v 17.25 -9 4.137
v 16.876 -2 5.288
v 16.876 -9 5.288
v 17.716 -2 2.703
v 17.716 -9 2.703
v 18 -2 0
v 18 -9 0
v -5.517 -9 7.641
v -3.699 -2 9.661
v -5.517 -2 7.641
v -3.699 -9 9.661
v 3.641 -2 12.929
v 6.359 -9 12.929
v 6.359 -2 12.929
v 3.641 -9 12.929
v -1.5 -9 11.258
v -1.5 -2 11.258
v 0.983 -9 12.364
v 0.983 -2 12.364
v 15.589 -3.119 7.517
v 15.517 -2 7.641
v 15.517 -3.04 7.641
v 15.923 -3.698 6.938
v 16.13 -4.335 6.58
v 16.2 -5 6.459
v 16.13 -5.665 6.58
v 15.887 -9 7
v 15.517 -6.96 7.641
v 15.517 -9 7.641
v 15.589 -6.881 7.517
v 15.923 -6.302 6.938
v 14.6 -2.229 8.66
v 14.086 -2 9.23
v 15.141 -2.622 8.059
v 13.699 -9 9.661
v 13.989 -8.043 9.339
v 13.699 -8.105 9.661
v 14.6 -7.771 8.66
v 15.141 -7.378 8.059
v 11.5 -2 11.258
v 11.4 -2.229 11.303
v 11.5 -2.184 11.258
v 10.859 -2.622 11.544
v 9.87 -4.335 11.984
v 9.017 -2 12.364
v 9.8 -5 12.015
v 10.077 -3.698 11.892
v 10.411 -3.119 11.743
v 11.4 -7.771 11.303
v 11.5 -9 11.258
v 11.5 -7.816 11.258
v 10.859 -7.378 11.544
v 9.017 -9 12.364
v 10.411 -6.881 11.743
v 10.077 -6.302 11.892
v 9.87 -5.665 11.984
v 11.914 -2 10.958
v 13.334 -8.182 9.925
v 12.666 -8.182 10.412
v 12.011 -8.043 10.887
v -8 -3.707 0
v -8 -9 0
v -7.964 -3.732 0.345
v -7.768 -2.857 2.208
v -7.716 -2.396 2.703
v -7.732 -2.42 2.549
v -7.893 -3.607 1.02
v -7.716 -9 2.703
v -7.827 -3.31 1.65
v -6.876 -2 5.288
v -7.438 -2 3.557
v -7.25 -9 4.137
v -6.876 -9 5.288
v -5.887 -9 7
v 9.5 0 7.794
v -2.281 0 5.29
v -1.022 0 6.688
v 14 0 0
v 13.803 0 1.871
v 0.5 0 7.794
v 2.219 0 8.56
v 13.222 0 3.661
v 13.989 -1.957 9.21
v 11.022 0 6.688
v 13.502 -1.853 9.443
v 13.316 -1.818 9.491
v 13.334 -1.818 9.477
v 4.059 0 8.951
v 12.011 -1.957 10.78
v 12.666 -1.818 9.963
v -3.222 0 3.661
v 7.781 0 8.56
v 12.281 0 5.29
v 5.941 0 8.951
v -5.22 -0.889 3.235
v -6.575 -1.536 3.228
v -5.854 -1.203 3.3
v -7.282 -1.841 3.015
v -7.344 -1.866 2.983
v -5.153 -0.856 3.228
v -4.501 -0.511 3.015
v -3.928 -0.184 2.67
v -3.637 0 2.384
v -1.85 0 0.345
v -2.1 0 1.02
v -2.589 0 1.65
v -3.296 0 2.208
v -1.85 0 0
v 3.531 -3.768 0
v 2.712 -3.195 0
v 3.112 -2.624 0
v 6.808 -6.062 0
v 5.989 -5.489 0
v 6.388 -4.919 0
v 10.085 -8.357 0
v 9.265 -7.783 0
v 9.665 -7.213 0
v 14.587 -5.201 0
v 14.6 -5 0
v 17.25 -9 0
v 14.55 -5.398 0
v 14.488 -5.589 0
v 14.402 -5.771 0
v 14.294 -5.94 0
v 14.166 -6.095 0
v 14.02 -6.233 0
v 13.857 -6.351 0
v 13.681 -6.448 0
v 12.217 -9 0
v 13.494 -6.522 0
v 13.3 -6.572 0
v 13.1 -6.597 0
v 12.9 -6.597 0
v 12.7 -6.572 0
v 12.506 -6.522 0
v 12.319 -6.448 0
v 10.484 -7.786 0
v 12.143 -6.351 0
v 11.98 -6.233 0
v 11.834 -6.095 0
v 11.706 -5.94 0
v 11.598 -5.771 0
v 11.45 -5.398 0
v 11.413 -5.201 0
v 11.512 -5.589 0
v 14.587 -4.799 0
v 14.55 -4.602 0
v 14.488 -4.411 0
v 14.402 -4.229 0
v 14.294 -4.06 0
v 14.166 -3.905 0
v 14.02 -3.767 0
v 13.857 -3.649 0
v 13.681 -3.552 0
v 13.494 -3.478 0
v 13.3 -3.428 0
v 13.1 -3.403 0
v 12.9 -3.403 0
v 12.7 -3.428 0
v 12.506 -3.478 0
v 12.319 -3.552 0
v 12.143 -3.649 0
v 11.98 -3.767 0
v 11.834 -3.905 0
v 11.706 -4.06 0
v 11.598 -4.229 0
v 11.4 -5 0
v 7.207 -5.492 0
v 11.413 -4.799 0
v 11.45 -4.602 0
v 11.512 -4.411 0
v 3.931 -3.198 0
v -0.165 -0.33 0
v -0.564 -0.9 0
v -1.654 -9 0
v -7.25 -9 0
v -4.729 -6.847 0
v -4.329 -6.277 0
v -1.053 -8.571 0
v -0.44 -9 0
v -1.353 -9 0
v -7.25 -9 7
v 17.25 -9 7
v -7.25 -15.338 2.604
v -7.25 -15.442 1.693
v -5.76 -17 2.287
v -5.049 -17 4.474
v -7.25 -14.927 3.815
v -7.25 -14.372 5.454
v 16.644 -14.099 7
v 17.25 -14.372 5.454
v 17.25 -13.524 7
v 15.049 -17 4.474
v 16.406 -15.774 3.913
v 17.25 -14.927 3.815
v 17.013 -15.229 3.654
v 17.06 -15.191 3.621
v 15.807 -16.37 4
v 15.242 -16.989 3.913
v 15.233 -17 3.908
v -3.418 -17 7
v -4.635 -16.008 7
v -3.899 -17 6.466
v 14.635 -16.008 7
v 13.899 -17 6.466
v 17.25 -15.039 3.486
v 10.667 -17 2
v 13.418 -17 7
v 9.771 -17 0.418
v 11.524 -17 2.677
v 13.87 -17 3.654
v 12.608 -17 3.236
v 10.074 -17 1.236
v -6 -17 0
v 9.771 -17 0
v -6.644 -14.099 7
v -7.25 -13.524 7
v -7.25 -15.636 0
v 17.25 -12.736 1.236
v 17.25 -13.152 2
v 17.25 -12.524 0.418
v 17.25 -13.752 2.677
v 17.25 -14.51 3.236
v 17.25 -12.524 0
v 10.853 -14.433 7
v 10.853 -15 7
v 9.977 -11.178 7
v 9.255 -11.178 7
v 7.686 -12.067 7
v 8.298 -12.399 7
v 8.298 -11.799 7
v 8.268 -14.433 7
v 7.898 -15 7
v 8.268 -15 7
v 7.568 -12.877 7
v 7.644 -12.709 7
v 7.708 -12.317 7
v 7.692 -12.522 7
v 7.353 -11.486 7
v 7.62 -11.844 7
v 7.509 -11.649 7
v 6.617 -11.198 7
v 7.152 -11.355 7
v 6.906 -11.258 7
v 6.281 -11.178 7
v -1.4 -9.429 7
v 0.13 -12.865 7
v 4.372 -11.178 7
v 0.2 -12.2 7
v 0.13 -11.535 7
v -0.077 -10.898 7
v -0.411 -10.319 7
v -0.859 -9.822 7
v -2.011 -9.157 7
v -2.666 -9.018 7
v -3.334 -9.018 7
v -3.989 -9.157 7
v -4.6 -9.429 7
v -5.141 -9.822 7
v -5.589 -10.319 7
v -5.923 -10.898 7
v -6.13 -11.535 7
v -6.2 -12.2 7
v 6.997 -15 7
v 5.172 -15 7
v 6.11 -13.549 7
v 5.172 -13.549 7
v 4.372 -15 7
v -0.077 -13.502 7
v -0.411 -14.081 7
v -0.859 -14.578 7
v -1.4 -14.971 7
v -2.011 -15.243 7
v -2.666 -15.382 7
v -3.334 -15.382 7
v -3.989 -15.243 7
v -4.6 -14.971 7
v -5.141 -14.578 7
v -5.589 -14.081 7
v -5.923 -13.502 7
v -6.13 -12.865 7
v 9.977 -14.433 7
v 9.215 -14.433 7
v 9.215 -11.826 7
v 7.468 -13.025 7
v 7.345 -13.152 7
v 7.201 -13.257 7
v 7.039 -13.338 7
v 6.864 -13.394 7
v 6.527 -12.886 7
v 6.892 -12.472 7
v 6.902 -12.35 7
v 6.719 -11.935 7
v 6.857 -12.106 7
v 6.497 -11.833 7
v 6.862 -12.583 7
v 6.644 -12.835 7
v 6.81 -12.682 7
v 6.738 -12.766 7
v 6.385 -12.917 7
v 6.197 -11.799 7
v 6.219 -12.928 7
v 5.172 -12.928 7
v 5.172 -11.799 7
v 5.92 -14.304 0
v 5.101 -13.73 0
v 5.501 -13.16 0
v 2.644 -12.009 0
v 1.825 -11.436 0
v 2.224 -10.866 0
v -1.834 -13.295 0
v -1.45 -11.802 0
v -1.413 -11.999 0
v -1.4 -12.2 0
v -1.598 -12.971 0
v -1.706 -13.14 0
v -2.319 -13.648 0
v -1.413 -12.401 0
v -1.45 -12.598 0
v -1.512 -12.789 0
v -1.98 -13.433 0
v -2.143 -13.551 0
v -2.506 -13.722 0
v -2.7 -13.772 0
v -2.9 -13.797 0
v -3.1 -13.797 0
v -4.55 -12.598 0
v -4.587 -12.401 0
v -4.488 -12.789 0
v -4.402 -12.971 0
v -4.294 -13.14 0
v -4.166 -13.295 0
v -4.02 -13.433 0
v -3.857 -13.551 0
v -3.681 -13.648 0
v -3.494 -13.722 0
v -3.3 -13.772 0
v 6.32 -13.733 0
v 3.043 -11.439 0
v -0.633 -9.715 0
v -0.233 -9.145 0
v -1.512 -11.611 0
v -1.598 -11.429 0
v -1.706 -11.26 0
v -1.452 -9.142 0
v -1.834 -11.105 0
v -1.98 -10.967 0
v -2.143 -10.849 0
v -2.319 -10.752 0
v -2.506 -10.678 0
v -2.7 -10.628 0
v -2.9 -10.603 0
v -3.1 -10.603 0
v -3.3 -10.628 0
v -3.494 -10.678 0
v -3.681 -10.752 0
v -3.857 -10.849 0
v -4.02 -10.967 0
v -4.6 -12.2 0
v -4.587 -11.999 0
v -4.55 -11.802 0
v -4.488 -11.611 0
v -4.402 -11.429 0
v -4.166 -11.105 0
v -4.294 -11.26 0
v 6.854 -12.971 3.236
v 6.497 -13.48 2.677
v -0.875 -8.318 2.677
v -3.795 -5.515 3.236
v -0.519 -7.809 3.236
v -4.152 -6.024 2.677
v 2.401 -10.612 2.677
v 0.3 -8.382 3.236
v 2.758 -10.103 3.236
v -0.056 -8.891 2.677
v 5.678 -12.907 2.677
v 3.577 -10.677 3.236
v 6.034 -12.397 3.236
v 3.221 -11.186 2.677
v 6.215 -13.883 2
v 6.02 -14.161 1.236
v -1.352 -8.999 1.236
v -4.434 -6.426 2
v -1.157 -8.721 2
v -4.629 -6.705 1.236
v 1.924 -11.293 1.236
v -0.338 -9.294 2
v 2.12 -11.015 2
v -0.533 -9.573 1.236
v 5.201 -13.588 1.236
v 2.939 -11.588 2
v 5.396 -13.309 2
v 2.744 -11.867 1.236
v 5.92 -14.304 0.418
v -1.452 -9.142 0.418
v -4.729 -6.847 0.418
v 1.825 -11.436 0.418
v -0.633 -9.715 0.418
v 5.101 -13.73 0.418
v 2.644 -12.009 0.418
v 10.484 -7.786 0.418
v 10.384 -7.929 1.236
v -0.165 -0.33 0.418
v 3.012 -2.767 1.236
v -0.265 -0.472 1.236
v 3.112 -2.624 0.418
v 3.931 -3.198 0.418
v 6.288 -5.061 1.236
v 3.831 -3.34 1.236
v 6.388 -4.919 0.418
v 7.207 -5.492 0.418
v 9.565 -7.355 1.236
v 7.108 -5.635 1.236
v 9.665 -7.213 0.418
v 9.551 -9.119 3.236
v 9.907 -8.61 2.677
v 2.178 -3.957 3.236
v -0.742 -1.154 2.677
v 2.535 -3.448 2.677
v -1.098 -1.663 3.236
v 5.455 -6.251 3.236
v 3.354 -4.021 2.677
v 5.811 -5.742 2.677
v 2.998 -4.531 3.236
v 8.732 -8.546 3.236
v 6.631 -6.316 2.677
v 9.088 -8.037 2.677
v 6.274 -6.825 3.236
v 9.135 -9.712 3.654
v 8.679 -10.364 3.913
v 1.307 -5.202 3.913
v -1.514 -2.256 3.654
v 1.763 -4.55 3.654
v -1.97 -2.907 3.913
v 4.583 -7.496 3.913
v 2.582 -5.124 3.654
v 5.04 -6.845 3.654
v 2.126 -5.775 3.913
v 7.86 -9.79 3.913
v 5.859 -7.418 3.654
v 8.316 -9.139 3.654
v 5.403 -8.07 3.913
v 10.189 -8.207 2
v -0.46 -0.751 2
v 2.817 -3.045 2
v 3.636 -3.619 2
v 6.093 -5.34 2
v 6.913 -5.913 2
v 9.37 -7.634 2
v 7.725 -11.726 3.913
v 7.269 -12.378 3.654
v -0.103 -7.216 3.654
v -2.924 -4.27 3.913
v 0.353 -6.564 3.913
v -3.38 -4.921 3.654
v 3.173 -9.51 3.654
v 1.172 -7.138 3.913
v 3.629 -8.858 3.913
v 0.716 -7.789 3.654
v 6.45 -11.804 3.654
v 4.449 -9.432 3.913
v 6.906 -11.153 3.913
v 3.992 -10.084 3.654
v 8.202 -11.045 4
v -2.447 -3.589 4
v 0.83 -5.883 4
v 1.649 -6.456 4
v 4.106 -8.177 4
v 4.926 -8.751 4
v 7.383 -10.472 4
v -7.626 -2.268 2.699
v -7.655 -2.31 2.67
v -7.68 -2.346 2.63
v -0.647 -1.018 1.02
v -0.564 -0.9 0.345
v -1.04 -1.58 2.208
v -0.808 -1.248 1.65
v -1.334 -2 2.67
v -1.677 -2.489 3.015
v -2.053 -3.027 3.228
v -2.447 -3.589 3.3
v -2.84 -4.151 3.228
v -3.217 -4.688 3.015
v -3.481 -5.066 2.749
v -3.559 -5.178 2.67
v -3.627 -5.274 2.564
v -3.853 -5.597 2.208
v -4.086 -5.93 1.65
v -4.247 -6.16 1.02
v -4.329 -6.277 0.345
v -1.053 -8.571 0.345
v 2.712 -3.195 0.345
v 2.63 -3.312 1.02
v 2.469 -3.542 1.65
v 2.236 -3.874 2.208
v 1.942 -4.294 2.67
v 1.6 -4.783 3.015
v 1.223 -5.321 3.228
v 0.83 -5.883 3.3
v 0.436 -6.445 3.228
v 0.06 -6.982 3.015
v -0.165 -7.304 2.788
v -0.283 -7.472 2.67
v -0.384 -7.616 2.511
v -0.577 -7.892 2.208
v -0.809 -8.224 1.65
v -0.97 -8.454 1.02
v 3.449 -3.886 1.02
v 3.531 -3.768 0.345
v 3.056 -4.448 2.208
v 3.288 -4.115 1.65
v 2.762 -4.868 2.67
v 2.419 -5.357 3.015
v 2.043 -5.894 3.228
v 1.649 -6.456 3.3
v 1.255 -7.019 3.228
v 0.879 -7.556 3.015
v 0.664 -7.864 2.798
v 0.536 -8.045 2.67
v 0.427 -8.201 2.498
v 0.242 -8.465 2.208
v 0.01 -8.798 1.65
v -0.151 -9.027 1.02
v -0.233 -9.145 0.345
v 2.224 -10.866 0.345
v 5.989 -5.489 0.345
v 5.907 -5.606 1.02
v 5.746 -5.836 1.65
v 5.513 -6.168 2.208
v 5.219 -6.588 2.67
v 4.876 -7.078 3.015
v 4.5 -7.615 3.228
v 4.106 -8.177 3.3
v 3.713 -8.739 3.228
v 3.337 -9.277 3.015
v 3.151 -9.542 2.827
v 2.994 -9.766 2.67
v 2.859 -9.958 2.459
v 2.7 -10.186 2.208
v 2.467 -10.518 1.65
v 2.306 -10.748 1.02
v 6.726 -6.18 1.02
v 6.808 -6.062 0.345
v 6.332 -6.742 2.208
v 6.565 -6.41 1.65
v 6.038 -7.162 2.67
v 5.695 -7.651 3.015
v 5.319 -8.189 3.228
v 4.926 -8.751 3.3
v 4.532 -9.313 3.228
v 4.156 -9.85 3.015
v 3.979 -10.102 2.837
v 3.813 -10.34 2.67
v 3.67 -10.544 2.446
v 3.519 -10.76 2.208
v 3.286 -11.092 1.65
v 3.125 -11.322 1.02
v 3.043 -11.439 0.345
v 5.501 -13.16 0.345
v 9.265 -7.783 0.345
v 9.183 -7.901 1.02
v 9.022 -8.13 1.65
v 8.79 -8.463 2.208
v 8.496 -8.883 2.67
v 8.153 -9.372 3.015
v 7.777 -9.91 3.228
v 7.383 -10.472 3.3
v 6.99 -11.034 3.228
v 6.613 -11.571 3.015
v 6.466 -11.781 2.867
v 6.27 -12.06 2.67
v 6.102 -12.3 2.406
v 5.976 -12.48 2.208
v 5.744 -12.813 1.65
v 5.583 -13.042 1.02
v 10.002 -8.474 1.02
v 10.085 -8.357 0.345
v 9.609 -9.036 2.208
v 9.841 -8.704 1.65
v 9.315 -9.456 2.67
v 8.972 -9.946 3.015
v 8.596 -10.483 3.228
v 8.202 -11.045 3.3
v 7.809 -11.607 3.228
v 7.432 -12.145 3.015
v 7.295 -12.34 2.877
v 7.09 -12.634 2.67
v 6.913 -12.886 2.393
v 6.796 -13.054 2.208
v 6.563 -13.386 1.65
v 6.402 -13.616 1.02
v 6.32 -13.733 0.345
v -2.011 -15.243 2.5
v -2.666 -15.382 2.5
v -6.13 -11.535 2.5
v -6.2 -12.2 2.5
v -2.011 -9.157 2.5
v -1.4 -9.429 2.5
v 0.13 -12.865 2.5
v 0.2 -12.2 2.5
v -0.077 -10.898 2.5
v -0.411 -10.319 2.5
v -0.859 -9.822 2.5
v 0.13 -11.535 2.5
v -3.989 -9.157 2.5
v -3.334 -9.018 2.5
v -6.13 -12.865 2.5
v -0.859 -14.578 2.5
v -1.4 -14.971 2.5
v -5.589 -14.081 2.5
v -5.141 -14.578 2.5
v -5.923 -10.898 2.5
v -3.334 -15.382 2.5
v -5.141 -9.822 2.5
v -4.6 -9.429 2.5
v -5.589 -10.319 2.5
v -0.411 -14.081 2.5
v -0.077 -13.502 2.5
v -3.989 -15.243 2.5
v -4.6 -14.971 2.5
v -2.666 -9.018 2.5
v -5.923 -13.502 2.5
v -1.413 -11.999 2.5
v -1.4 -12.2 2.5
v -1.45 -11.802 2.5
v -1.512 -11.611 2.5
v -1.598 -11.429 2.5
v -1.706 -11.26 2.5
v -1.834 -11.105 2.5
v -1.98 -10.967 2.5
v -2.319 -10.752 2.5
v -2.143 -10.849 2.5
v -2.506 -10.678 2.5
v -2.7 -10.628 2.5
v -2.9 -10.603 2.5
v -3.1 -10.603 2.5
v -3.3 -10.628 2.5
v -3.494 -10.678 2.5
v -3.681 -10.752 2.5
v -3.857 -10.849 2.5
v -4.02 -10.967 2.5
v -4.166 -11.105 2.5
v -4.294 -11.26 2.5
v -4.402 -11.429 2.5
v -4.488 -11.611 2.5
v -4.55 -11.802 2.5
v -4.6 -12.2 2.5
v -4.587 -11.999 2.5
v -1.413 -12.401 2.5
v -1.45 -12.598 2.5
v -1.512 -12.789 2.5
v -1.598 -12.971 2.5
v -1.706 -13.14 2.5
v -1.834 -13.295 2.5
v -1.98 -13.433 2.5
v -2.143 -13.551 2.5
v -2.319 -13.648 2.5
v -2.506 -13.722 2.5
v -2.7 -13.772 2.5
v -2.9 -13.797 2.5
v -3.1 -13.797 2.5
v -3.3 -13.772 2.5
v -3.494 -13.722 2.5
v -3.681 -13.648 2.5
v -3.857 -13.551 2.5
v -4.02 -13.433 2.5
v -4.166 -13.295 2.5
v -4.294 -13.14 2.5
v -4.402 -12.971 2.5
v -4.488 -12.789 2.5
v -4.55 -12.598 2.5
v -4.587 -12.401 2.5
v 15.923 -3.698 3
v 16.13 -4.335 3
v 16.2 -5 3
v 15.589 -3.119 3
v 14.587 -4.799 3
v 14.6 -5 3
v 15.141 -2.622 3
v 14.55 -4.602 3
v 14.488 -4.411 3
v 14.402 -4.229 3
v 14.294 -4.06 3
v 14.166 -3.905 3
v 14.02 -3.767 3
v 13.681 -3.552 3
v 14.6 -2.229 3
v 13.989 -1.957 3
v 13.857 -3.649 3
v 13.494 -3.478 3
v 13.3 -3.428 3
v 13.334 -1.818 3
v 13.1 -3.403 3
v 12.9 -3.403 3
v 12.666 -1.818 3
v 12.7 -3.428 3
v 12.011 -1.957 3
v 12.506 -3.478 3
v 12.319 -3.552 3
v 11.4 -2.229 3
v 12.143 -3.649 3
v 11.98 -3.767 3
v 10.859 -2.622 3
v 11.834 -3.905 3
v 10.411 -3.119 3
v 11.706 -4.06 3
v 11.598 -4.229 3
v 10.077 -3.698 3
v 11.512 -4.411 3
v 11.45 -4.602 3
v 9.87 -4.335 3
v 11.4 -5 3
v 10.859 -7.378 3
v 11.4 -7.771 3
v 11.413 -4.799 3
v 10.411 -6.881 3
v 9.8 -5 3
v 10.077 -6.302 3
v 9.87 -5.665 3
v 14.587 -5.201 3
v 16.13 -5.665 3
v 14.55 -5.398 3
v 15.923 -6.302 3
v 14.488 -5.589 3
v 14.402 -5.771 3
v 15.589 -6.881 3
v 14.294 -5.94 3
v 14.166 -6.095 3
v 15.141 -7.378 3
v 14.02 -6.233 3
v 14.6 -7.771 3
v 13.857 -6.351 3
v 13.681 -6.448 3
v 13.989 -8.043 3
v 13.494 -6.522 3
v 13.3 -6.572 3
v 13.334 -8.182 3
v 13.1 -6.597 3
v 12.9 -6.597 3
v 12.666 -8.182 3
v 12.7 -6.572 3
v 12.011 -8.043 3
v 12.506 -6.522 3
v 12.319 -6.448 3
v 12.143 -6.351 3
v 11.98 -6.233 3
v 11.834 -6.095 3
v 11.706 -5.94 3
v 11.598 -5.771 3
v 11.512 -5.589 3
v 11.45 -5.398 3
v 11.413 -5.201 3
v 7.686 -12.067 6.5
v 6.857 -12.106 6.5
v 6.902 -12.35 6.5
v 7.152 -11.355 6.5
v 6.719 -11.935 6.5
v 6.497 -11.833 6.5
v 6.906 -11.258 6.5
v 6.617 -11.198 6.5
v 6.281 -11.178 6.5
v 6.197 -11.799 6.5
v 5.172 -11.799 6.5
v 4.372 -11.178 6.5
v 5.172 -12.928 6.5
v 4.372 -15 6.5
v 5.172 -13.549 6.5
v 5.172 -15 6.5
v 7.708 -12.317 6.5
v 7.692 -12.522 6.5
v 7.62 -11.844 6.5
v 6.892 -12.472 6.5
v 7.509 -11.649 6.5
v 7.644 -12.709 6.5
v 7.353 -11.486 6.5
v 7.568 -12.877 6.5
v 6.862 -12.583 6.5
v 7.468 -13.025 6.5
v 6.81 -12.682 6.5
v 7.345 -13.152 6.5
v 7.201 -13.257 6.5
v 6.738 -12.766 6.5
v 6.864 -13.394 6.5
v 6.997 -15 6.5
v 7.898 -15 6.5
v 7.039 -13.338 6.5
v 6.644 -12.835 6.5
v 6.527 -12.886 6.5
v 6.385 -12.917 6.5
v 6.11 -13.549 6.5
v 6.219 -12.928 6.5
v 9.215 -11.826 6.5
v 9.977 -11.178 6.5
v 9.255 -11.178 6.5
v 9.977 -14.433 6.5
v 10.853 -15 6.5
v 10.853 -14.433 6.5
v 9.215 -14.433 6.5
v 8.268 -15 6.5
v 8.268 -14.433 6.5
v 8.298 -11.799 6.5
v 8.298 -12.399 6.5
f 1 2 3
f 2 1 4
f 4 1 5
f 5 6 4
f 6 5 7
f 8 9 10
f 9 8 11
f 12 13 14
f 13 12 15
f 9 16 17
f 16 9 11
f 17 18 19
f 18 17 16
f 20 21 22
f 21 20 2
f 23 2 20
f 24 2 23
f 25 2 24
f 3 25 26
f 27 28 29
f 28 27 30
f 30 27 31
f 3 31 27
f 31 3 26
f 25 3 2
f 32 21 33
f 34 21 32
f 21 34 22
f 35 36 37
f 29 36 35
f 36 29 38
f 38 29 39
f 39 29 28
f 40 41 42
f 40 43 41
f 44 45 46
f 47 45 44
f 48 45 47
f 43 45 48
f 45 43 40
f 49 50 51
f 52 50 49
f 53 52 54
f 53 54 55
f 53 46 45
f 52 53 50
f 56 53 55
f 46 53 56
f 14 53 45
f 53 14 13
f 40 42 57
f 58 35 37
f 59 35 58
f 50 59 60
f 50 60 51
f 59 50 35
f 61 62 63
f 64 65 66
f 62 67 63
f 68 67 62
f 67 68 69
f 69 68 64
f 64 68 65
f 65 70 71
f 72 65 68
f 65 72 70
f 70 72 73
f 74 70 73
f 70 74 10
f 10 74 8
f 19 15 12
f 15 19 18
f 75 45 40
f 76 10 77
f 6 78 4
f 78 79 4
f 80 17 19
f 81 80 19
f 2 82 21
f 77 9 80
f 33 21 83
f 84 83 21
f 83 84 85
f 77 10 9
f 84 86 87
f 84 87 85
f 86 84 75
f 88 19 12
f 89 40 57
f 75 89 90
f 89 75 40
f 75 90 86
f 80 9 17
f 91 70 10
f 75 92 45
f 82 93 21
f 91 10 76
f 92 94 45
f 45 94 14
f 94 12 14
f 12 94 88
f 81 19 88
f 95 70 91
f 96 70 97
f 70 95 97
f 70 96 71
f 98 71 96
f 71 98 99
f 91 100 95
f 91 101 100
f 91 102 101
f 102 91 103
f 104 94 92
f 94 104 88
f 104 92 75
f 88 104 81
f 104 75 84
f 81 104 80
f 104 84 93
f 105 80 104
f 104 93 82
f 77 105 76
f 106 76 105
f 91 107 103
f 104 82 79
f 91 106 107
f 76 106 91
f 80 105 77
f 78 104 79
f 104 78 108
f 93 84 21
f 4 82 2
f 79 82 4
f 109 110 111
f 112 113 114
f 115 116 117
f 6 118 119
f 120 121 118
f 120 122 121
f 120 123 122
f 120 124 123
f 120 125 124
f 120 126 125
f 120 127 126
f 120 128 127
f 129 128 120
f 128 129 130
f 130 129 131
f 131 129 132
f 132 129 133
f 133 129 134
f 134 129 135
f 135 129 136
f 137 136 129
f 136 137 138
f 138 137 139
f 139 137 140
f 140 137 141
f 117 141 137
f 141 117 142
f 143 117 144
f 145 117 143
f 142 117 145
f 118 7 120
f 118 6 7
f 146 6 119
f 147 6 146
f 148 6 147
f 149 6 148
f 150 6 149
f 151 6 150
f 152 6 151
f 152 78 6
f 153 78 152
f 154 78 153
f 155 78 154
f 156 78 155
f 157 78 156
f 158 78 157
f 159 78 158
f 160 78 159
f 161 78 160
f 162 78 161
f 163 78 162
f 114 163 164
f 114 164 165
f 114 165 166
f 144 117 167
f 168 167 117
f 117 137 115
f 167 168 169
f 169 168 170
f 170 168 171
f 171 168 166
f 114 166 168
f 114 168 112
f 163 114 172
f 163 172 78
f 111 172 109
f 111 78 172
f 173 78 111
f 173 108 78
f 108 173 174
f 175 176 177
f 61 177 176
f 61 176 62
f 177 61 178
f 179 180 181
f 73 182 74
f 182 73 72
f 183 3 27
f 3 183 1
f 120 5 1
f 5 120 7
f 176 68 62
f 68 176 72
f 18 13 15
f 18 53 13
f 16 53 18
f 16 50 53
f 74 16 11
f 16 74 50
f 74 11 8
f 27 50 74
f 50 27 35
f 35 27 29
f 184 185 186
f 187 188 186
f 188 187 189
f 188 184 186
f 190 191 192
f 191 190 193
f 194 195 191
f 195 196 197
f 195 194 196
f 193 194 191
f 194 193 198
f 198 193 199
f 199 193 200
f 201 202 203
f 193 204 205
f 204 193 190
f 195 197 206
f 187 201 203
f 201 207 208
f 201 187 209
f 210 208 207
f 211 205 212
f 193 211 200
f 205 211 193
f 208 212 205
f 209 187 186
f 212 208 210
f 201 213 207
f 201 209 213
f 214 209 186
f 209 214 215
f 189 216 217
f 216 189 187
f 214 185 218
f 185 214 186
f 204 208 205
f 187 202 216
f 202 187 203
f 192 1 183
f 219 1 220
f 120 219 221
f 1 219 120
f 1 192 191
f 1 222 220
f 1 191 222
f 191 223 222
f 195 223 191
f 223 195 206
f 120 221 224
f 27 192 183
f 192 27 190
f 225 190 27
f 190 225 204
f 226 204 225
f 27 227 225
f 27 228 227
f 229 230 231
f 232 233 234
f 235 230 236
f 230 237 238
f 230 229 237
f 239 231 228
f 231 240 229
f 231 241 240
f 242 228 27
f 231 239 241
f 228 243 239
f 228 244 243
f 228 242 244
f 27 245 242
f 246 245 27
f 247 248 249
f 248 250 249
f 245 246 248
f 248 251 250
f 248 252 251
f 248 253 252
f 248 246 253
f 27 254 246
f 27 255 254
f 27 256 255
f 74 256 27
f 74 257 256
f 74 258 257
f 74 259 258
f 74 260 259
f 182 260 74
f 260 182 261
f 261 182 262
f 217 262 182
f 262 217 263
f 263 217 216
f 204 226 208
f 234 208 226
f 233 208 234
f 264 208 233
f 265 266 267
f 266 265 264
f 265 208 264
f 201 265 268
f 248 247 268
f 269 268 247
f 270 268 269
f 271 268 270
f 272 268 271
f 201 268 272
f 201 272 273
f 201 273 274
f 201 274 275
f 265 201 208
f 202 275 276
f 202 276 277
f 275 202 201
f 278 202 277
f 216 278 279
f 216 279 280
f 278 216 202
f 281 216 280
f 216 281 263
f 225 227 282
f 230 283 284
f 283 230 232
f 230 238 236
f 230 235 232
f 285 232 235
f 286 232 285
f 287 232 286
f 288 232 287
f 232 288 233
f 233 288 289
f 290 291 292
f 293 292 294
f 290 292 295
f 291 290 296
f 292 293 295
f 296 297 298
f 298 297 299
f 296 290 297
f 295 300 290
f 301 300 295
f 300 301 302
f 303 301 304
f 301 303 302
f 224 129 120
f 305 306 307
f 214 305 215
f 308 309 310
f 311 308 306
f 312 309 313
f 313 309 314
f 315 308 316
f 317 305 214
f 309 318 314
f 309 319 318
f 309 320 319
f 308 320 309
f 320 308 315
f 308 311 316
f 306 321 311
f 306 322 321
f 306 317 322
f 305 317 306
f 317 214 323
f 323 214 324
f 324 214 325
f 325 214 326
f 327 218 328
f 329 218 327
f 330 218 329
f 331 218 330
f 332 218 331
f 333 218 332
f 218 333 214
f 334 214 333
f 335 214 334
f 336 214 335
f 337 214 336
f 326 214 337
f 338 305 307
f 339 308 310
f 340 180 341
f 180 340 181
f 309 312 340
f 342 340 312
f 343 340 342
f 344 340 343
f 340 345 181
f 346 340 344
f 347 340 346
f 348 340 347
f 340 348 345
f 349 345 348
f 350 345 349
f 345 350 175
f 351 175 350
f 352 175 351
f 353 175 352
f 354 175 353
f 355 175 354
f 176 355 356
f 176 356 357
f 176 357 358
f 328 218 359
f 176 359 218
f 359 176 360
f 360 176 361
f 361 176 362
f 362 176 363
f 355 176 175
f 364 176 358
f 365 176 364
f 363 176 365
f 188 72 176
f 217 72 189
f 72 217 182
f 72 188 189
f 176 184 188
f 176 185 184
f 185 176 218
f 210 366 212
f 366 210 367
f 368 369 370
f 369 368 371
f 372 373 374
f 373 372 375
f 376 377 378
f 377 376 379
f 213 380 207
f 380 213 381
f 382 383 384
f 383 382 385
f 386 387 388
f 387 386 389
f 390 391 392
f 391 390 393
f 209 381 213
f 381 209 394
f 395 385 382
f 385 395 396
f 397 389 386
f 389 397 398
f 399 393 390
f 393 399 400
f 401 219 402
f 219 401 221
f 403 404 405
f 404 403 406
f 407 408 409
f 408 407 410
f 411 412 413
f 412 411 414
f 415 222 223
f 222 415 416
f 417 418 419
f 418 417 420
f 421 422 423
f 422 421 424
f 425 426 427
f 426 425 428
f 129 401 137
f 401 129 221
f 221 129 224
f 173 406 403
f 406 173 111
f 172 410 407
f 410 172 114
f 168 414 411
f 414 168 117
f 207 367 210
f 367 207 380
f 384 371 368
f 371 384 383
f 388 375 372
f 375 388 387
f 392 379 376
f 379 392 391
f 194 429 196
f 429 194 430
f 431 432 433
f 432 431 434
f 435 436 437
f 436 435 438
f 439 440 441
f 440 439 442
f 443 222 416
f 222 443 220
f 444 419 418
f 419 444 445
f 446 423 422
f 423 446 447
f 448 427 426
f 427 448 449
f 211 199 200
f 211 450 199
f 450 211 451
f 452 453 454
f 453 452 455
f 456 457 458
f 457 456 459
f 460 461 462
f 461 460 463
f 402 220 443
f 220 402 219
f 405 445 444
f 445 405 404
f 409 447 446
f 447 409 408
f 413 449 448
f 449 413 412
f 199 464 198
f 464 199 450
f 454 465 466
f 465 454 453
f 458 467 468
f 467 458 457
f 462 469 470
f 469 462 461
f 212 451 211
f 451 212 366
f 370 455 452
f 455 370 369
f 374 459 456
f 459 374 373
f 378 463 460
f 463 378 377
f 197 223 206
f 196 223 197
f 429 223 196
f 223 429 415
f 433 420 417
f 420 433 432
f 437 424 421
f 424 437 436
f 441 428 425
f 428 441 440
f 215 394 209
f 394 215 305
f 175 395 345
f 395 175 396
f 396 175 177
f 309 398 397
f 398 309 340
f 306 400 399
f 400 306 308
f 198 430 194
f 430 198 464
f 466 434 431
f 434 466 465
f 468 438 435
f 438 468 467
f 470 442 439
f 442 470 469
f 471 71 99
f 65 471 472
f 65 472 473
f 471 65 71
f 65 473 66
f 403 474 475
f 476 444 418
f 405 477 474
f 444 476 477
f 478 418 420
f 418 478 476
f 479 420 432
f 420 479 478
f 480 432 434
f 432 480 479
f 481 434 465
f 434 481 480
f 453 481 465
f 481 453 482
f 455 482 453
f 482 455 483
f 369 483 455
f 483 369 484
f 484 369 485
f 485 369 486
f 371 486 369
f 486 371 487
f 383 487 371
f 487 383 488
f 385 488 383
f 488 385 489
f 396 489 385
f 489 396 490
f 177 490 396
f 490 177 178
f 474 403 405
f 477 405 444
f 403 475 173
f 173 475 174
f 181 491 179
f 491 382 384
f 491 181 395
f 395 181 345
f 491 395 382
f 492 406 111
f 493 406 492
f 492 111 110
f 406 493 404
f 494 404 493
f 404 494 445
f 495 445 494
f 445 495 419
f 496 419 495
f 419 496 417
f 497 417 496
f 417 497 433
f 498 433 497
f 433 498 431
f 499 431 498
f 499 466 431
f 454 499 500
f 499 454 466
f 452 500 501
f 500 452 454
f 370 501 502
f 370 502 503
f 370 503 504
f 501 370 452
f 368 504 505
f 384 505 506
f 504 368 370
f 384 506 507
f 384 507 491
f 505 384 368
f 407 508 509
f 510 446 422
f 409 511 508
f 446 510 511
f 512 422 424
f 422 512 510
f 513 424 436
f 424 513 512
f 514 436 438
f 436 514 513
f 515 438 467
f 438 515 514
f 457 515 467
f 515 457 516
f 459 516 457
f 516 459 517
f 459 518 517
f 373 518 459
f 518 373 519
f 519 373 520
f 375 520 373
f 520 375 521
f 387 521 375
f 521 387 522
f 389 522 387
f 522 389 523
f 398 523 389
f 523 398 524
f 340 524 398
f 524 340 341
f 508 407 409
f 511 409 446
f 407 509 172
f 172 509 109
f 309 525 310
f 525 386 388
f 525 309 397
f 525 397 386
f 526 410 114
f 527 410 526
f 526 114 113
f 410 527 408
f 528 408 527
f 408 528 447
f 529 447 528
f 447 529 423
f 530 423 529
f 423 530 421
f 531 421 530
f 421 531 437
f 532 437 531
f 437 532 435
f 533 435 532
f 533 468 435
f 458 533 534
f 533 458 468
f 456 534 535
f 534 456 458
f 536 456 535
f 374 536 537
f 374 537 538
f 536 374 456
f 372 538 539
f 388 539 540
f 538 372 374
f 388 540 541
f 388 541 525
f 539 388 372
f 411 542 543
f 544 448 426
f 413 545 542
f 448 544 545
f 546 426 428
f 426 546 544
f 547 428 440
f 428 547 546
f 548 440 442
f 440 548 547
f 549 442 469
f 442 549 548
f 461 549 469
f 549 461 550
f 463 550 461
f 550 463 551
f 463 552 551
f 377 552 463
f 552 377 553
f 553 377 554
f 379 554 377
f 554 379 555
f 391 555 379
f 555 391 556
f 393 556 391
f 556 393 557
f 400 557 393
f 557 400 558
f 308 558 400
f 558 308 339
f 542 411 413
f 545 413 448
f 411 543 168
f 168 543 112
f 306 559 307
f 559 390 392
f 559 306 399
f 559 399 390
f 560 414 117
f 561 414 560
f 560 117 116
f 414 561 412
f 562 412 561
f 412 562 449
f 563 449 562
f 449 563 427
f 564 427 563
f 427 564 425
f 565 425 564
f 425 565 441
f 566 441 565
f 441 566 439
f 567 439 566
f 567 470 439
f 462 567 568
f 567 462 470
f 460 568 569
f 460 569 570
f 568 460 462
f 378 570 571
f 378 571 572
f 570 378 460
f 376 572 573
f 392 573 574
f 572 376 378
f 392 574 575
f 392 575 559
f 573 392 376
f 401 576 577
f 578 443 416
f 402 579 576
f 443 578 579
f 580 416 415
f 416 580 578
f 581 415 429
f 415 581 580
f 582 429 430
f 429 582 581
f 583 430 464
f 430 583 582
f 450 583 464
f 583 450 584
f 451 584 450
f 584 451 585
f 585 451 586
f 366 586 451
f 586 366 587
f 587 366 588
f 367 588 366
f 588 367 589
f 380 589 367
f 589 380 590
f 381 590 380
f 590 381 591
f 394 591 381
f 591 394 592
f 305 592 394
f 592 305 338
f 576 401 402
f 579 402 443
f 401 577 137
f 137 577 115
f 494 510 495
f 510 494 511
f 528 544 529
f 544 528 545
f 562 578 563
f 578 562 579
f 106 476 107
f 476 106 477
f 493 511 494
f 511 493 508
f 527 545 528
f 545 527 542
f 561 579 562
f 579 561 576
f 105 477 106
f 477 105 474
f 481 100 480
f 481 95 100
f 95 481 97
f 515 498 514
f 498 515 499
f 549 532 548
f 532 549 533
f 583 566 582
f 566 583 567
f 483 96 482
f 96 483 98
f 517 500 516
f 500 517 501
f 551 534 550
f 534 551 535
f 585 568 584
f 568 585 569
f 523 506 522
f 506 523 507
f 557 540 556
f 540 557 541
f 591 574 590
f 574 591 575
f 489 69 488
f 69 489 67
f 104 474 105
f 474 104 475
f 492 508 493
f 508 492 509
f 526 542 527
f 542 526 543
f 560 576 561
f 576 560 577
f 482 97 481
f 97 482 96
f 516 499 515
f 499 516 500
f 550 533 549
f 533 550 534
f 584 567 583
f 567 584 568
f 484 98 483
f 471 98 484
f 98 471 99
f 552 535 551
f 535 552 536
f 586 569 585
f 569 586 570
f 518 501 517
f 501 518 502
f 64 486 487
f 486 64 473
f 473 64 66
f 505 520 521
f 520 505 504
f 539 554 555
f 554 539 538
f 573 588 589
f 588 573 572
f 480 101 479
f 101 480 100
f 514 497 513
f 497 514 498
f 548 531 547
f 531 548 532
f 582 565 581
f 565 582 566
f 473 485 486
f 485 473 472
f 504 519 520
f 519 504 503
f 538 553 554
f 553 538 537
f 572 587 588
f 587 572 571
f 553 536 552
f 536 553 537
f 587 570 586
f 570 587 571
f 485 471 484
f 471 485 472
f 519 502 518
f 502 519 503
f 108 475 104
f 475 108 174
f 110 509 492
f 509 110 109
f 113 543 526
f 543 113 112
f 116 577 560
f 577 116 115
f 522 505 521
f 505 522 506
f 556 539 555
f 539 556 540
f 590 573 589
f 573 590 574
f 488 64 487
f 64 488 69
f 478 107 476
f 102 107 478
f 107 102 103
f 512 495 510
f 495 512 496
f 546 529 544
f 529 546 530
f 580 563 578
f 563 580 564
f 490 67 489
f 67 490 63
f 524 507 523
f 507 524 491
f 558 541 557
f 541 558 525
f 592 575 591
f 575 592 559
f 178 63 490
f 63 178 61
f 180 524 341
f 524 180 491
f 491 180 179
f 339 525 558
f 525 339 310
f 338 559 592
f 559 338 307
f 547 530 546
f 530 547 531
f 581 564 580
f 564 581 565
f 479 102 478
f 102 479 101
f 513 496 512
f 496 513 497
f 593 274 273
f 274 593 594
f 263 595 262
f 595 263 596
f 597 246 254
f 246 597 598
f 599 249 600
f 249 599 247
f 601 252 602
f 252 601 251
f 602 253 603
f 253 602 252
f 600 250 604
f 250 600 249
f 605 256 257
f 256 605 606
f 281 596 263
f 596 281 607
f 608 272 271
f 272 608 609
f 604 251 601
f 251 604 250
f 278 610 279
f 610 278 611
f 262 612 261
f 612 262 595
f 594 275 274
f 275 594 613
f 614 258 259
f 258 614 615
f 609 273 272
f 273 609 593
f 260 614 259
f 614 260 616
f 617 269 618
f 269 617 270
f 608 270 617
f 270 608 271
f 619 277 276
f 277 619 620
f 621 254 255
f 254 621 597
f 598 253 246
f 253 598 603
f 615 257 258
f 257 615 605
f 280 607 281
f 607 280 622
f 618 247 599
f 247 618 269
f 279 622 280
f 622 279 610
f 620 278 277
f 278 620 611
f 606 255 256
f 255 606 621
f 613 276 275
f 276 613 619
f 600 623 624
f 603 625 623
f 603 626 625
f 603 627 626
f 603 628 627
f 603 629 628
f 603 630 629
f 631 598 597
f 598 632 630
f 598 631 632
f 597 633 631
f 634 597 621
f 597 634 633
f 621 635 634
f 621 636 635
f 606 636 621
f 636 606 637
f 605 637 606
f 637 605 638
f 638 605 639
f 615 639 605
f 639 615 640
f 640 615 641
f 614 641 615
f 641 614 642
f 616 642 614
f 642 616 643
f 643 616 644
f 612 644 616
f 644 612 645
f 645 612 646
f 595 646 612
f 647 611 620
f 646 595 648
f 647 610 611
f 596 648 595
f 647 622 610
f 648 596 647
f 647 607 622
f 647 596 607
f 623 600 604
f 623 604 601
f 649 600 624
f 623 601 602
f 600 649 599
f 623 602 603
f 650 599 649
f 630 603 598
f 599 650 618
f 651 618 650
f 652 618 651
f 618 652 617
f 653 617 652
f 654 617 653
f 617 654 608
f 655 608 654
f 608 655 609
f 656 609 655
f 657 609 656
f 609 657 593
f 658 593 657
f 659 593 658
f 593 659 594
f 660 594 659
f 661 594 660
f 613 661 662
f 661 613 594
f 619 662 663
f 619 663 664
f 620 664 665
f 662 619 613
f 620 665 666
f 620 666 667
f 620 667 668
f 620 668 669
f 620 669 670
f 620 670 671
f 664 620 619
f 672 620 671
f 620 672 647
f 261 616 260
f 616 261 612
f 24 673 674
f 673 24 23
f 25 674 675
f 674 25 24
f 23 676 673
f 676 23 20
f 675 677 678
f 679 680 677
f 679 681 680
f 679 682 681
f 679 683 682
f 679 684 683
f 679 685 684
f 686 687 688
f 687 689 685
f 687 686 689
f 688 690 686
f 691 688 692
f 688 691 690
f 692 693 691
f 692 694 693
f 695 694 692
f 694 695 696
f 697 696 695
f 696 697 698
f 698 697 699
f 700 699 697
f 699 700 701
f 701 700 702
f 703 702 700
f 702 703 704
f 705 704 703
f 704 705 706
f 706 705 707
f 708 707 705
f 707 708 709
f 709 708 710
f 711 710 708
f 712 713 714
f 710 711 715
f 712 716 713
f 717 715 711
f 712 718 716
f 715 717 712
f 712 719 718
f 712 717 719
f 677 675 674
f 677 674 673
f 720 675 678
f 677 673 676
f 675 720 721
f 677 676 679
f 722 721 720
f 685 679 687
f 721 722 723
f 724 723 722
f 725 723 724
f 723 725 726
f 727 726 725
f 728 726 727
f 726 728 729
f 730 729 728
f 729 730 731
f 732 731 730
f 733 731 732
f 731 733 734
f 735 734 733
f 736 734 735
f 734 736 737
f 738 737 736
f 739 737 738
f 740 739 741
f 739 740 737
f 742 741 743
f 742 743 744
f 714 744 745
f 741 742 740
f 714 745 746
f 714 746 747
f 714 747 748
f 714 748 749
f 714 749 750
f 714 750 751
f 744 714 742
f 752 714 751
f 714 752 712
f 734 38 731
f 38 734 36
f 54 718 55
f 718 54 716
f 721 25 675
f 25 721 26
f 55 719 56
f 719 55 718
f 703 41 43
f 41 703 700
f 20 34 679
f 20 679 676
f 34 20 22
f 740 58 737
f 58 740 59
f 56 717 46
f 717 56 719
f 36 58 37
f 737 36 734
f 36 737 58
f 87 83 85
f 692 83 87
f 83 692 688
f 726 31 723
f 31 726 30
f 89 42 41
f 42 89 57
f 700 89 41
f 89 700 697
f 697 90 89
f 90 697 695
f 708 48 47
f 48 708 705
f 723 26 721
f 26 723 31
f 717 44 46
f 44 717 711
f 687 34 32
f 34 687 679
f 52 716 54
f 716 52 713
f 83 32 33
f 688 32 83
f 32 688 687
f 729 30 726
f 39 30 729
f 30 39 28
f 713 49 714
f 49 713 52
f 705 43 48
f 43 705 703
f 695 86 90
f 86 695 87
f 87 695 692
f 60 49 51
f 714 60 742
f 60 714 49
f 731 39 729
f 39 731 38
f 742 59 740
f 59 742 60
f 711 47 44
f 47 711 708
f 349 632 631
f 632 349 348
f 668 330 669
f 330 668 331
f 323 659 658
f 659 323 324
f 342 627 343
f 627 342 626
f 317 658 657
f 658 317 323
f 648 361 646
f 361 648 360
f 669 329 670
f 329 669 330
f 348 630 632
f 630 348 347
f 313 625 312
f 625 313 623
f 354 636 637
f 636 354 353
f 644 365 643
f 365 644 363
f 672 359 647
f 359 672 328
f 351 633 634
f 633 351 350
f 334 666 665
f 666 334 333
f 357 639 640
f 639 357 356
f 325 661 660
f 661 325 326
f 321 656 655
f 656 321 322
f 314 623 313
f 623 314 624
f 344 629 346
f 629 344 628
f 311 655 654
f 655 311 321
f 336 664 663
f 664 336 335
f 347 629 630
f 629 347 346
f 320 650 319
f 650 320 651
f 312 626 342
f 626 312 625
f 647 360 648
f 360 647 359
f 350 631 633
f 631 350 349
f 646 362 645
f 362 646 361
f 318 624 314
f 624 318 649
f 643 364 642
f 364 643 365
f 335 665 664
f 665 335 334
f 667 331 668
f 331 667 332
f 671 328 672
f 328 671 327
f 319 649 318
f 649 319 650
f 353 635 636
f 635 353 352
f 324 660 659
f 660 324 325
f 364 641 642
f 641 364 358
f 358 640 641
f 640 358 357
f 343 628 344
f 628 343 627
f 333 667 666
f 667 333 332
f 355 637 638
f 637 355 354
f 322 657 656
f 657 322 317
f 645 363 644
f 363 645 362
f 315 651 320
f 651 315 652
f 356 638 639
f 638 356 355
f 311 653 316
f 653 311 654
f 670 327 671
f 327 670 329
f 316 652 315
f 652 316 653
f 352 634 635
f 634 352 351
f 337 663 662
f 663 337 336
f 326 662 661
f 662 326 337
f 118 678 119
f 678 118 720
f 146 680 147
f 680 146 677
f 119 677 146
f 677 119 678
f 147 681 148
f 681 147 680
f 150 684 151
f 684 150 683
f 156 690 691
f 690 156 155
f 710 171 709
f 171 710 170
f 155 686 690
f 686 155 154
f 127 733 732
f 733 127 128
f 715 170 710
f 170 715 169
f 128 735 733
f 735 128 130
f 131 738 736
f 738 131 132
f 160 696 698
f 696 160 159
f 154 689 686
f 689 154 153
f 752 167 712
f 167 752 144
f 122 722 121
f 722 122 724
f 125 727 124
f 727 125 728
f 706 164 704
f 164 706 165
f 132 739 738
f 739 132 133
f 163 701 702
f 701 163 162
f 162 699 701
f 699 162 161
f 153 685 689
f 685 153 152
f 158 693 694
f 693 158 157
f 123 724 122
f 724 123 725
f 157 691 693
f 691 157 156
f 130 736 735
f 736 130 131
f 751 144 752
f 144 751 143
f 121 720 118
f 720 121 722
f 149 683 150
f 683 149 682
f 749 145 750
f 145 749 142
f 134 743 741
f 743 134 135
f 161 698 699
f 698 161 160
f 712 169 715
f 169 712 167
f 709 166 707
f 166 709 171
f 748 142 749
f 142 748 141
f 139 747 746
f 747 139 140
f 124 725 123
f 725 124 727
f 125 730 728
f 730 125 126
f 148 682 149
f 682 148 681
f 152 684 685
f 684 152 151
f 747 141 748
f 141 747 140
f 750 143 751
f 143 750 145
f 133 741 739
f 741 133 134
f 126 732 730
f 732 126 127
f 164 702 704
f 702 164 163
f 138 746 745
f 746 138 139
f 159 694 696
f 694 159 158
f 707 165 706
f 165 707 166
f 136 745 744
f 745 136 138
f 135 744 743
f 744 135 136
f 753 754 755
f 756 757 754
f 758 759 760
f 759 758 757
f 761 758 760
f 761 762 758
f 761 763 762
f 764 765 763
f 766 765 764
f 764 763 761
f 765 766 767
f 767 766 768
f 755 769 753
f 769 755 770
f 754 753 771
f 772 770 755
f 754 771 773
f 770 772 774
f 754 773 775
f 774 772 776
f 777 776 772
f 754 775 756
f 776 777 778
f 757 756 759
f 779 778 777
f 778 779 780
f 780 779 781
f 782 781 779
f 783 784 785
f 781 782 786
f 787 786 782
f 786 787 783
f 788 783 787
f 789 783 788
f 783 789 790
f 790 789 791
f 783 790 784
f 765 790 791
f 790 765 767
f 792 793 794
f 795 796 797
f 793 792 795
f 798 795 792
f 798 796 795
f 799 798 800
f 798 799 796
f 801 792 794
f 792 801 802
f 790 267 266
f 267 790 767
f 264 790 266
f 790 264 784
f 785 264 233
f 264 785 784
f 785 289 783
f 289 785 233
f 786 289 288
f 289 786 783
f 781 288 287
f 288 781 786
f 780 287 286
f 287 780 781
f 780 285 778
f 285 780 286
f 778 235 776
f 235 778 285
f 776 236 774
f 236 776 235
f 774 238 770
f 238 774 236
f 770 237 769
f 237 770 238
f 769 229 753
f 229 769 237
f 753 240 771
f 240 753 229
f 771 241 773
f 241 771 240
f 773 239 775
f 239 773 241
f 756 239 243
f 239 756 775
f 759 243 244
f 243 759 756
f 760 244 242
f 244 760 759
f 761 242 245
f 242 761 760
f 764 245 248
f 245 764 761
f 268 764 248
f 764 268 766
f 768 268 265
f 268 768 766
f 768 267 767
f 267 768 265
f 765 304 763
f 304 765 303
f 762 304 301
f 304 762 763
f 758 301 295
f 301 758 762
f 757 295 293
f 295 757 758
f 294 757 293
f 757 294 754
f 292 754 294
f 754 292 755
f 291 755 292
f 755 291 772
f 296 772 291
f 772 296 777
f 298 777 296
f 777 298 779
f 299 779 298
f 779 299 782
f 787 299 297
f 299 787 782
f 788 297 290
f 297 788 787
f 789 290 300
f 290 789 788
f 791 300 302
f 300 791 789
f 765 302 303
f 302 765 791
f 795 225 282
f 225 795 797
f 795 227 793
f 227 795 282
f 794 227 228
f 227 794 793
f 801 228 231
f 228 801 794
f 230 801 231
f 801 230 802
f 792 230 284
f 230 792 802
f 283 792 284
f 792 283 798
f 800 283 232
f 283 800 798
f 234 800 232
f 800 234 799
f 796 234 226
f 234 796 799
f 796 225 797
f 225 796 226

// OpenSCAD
// PIRANHA iteration1
// LCD cover
// GNU GPL v3
// Usan Siriwardana <usiriwar@uwaterloo.ca> and contributors
// based on Prusa i3 MK3S
// https://reprap.org/wiki/Prusa_i3_MK3

 module heatbed_cable_clip()
{
    
difference()
{    
    
    union()
    {
        difference()
        {
            union()
            {
                // body base
                translate([75,99,28]) rotate([90,0,0]) cylinder( h = 15, r = 13, $fn=30); 
                translate([75,101,28]) rotate([90,0,0]) cylinder( h = 2, r1=9,r2 = 13, $fn=30); 
                
            }

             
           
            
            // cut flat and shape
            translate([60,82,14]) cube([30,20,14]);  
            translate([60,72,20]) cube([30,20,30]); 
        }
         
        
        difference() {
        translate([62.75,84,28]) cube([24.5,8,7]);
        difference () {
        translate([75,85,28]) rotate([90,0,0]) cube([30,20,10], center = true);    
        translate([75,90,28]) rotate([90,0,0]) cylinder(h=6,r1=16.5,r2=11,$fn=30);   
           
        } 
    }}
    
    // cable opening
    translate([61,102,28]) rotate([35,90,0]) difference (){
        cylinder(h=35,r=4,$fn=30);
    
        translate([0,0,3]) cylinder(h=5,r=4,$fn=30);
        translate([0,0,12]) cylinder(h=1,r=4,$fn=30); 
        translate([0,0,16]) cylinder(h=1,r=4,$fn=30); 
        translate([0,0,20]) cylinder(h=1,r=4,$fn=30); 
    }
    
    translate([61,102,28]) rotate([35,90,0]) cylinder(h=35,r=3.3,$fn=30);
    
  
    
    // screw heads
    translate([67,88.8,30.5]) rotate([0,0,0]) cylinder(h=10,r=3.2,$fn=30); 
    translate([83,96,31]) rotate([0,0,0]) cylinder(h=10,r=3.2,$fn=30); 
    
    
    // screws
            translate([67,88.8,14]) rotate([0,0,0]) cylinder(h=35,r=1.6,$fn=50); 
            translate([83,96,14]) rotate([0,0,0]) cylinder(h=35,r=1.6,$fn=50);
    
    // version
        translate([74,86,34.5]) rotate([0,0,0]) linear_extrude(height = 0.6) 
        { text("R1",font = "helvetica:style=Bold", size=4); }
    
    
    
}


    

} 

translate([-70, -101, -28]) heatbed_cable_clip();
